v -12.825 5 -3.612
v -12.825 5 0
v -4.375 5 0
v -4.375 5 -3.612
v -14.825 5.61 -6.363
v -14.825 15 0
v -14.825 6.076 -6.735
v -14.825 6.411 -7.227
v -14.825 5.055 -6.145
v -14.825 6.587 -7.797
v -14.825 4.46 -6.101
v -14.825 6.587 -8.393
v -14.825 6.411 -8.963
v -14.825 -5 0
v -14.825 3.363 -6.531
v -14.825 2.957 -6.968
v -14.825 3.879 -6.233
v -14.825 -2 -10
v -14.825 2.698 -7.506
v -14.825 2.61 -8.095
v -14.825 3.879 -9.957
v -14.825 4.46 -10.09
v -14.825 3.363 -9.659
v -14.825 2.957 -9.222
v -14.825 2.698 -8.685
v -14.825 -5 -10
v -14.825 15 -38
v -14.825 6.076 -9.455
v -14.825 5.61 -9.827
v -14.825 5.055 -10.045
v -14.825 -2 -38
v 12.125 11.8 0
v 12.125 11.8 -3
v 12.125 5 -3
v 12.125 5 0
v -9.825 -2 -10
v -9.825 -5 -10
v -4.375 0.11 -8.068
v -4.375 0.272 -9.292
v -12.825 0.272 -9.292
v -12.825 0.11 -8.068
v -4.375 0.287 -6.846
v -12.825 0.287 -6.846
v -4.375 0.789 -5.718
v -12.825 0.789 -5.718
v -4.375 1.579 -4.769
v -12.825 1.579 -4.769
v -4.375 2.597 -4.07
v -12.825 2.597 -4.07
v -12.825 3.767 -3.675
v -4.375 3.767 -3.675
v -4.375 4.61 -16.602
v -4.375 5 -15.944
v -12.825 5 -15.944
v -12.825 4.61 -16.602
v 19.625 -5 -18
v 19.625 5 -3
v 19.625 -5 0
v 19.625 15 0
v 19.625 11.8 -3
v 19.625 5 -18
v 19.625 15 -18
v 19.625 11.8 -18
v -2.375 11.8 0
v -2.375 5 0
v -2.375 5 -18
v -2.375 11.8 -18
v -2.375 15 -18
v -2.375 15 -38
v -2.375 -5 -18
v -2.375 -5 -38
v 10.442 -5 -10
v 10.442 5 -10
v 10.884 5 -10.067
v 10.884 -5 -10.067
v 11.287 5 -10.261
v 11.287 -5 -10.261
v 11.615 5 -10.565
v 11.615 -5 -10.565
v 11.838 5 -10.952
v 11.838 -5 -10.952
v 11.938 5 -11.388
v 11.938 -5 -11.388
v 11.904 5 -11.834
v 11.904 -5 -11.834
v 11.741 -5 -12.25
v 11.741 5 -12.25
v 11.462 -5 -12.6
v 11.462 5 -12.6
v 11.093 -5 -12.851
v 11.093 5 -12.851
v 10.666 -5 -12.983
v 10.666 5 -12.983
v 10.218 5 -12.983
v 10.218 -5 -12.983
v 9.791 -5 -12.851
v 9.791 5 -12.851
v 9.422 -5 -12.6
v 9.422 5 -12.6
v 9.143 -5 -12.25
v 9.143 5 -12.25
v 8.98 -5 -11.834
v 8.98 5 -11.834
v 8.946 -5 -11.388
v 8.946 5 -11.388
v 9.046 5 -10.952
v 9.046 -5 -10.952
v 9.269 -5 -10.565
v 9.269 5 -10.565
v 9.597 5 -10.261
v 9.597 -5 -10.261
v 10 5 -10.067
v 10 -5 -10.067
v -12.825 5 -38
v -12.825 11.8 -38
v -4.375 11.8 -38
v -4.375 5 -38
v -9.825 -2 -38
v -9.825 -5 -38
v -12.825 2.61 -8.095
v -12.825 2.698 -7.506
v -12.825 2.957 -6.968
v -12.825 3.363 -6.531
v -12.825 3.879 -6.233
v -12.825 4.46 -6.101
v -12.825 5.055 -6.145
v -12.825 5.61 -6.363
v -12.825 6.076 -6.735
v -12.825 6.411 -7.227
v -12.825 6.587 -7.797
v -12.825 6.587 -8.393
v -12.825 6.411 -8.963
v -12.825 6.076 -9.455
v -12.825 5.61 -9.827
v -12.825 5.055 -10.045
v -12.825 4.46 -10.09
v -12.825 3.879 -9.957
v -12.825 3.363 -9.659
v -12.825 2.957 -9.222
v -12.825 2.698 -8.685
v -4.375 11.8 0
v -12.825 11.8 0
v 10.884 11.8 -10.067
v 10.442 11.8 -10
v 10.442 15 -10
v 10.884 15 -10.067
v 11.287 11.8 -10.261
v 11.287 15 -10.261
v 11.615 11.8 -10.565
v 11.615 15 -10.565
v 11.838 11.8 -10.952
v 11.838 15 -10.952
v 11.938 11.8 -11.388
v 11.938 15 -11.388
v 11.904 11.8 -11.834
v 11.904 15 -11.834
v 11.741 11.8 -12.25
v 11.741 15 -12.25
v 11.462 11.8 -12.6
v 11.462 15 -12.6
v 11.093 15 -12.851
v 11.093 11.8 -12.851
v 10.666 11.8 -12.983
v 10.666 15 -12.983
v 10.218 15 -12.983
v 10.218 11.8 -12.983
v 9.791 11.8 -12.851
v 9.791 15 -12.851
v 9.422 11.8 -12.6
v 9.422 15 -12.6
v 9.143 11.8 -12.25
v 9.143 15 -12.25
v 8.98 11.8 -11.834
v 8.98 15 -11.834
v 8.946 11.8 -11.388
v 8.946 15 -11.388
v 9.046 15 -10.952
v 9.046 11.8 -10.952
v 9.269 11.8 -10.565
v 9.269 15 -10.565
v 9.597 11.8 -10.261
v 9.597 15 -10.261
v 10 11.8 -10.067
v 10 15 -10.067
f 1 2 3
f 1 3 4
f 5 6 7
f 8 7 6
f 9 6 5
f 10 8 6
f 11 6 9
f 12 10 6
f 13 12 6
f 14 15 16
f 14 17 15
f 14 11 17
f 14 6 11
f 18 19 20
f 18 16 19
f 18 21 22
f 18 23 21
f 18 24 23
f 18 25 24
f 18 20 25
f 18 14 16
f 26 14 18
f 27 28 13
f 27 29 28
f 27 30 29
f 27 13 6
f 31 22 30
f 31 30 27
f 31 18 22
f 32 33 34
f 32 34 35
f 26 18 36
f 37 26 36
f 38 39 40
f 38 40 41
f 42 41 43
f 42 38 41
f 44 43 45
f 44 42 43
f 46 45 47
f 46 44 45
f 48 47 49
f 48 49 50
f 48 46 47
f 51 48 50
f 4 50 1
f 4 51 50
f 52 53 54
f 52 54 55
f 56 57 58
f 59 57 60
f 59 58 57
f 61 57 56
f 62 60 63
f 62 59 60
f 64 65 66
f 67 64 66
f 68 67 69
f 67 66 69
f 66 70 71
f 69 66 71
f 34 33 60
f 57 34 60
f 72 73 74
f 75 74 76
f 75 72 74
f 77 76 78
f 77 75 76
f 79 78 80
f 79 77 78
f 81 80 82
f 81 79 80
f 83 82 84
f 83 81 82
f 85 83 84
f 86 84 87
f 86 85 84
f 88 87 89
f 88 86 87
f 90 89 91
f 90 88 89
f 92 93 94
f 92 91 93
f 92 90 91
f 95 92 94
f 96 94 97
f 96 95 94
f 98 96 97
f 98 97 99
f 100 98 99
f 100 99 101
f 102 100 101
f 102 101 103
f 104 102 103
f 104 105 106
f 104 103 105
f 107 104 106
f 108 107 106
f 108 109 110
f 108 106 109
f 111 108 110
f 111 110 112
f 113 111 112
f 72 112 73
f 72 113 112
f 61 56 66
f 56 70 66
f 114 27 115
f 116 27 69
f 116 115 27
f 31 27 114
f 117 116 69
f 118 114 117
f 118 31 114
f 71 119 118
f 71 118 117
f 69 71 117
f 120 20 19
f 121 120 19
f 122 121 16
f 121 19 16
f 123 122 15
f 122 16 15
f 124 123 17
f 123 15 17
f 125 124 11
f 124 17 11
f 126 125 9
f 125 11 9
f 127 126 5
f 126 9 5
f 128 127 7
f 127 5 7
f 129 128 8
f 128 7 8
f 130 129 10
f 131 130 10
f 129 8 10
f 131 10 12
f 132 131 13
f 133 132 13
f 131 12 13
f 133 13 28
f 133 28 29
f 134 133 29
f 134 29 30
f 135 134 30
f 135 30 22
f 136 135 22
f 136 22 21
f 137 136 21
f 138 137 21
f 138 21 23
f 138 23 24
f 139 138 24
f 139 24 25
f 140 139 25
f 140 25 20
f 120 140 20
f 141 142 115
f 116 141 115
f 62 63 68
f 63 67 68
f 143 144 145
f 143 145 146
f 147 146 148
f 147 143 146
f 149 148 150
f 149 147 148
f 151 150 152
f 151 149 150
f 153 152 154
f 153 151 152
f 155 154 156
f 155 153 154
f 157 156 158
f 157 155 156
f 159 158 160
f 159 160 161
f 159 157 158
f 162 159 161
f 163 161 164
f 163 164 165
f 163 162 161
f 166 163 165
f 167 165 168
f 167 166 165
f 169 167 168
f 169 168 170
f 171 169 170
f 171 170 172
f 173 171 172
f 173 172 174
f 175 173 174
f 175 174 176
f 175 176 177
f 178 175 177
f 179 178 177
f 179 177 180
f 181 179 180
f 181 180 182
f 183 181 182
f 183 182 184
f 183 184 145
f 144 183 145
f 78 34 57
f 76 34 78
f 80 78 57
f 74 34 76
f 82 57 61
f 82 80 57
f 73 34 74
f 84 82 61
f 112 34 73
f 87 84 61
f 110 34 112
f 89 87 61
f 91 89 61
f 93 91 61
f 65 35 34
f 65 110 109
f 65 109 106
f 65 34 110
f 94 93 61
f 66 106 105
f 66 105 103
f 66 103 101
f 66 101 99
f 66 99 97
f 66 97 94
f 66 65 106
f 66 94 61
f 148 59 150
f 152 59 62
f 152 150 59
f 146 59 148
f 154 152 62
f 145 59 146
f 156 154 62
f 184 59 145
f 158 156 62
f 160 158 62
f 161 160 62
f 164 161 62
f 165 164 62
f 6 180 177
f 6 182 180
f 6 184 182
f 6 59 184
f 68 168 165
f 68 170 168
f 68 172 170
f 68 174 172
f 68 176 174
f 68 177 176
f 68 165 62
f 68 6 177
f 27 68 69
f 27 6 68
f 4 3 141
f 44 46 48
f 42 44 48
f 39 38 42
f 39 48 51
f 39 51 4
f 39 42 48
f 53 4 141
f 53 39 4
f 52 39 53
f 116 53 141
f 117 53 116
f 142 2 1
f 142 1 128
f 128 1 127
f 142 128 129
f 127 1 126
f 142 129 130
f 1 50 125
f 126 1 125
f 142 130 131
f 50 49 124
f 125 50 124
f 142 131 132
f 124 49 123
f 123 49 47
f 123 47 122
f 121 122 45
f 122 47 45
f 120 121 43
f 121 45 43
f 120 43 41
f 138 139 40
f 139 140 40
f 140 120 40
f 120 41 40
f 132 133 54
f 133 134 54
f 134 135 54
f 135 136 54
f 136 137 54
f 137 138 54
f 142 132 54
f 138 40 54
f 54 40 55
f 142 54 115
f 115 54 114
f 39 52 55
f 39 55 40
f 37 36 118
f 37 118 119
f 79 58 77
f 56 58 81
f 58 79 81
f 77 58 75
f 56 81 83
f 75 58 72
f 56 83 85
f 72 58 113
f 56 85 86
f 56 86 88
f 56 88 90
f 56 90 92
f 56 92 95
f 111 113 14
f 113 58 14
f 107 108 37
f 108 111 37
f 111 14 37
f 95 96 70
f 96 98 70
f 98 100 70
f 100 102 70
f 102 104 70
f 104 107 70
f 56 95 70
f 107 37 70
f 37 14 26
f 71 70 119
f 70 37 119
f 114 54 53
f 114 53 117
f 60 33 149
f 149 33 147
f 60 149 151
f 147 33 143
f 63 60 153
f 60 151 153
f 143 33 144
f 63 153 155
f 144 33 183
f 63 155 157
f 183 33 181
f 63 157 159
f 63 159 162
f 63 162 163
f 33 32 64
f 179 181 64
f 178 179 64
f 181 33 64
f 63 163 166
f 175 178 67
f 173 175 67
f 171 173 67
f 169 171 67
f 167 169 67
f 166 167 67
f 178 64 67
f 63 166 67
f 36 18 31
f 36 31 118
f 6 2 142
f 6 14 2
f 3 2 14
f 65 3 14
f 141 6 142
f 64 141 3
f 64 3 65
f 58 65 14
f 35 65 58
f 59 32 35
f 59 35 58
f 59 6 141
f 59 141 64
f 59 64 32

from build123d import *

# Parameters (mm, degrees)
SKETCH1_W             = 19
SKETCH1_H             = 10
BOSS_EXTRUDE1_DEPTH   = 18
SKETCH1_H_2           = 3.2
BOSS_EXTRUDE1_2_DEPTH = 18
SKETCH1_6_W           = 12.45
SKETCH1_6_H           = 3.2
BOSS_EXTRUDE6_DEPTH   = 38
BOSS_EXTRUDE7_DEPTH   = 10
SKETCH4_W             = 18
SKETCH4_H             = 10
SKETCH4_H_2           = 3.2
BOSS_EXTRUDE8_DEPTH   = 3
CUT_EXTRUDE1_START    = -10
SKETCH6_R             = 1.5
CUT_EXTRUDE1_DEPTH    = 20
BOSS_EXTRUDE10_REACH  = 45.922
SKETCH7_W             = 2
SKETCH7_H             = 38
BOSS_EXTRUDE11_REACH  = 47.95
SKETCH8_W             = 7.5
SKETCH8_H             = 3
SKETCH9_R             = 2
CUT_EXTRUDE2_DEPTH    = 2
CUT_EXTRUDE3_START    = -10.45
CUT_EXTRUDE3_DEPTH    = 8.45


# Read off the part's stored shape, not the designer's step: Cut-Extrude3
with BuildPart() as part:
    # Sketch1 → Boss-Extrude1 (new body)
    with BuildSketch(Plane.XY):
        with Locations((7.125, 0)):
            Rectangle(SKETCH1_W, SKETCH1_H)
    extrude(amount=-BOSS_EXTRUDE1_DEPTH)



with BuildPart() as body_2:
    # Sketch1 → Boss-Extrude1 2 (new body)
    with BuildSketch(Plane.XY):
        with Locations((7.125, 13.4)):
            Rectangle(SKETCH1_W, SKETCH1_H_2)
    extrude(amount=-BOSS_EXTRUDE1_2_DEPTH)


with BuildPart() as part_1:
    add(part.part)

    add(body_2.part)  # Boss-Extrude6 merges body 2
    # Sketch1<6> → Boss-Extrude6 (add)
    with BuildSketch(Plane.XY):
        Polygon((-14.825, 5), (-14.825, -2), (-9.825, -2), (-9.825, -5), (-2.375, -5), (-2.375, 5), align=None)
        with Locations((-8.6, 13.4)):
            Rectangle(SKETCH1_6_W, SKETCH1_6_H)
    extrude(amount=-BOSS_EXTRUDE6_DEPTH)

    # Sketch1<7> → Boss-Extrude7 (add)
    with BuildSketch(Plane.XY):
        Polygon((-14.825, -2), (-14.825, -3.3), (-14.825, -5), (-9.825, -5), (-9.825, -2), align=None)
    extrude(amount=-BOSS_EXTRUDE7_DEPTH)

    # Sketch4 → Boss-Extrude8 (add)
    with BuildSketch(Plane(origin=(16.625, 0, 0), x_dir=(0, 0, -1), z_dir=(1, 0, 0))):
        with Locations((9, 0)):
            Rectangle(SKETCH4_W, SKETCH4_H)
        with Locations((9, 13.4)):
            Rectangle(SKETCH4_W, SKETCH4_H_2)
    extrude(amount=BOSS_EXTRUDE8_DEPTH)

    # Sketch6 → Cut-Extrude1 (cut)
    with BuildSketch(Plane(origin=(0, 5, 0), x_dir=(1, 0, 0), z_dir=(0, 1, 0)).offset(CUT_EXTRUDE1_START)):
        with Locations(Location((10.44201924, 11.5, 0), (0, 0, 270))):
            Circle(SKETCH6_R)
    extrude(amount=CUT_EXTRUDE1_DEPTH, mode=Mode.SUBTRACT)

    # Sketch7 → Boss-Extrude10 (add, up to next)
    with BuildSketch(Plane(origin=(0, 5, 0), x_dir=(1, 0, 0), z_dir=(0, 1, 0)), mode=Mode.PRIVATE) as boss_extrude10_sk1:
        with Locations((-3.375, 19)):
            Rectangle(SKETCH7_W, SKETCH7_H)
    boss_extrude10_tool1 = extrude(boss_extrude10_sk1.sketch, amount=BOSS_EXTRUDE10_REACH, mode=Mode.PRIVATE) - part_1.part
    # Sketch7 → Boss-Extrude10 (add, up to next)
    with BuildSketch(Plane(origin=(0, 5, 0), x_dir=(1, 0, 0), z_dir=(0, 1, 0)), mode=Mode.PRIVATE) as boss_extrude10_sk2:
        with Locations((-13.825, 19)):
            Rectangle(SKETCH7_W, SKETCH7_H)
    boss_extrude10_tool2 = extrude(boss_extrude10_sk2.sketch, amount=BOSS_EXTRUDE10_REACH, mode=Mode.PRIVATE) - part_1.part
    add(boss_extrude10_tool1.solids().sort_by_distance((-3.375, 5, -19))[0])
    add(boss_extrude10_tool2.solids().sort_by_distance((-13.825, 5, -19))[0])

    # Sketch8 → Boss-Extrude11 (add, up to next)
    with BuildSketch(Plane.XZ.offset(-11.8), mode=Mode.PRIVATE) as boss_extrude11_sk1:
        with Locations((15.875, -1.5)):
            Rectangle(SKETCH8_W, SKETCH8_H)
    boss_extrude11_tool1 = extrude(boss_extrude11_sk1.sketch, amount=BOSS_EXTRUDE11_REACH, mode=Mode.PRIVATE) - part_1.part
    add(boss_extrude11_tool1.solids().sort_by_distance((15.875, 11.8, -1.5))[0])

    # Sketch9 → Cut-Extrude2 (cut)
    with BuildSketch(Plane.ZY.offset(14.825)):
        with Locations(Location((-8.095100141, 4.609535031, 0), (0, 0, 270))):
            Circle(SKETCH9_R)
    extrude(amount=-CUT_EXTRUDE2_DEPTH, mode=Mode.SUBTRACT)

    # Cut-Extrude3 outline → Cut-Extrude3 (cut)
    with BuildSketch(Plane.ZY.offset(14.825).offset(CUT_EXTRUDE3_START)):
        with BuildLine():
            Line((-3.612072469, 5), (-15.943641317, 5))
            Line((-15.943641317, 5), (-16.601615213, 4.609535031))
            Line((-16.601615213, 4.609535031), (-9.291615213, 0.271522619))
            ThreePointArc((-9.291615213, 0.271522619), (-5.215878744, 1.151199572), (-3.612072469, 5))
        make_face()
    extrude(amount=CUT_EXTRUDE3_DEPTH, mode=Mode.SUBTRACT)


solid = part_1.part
